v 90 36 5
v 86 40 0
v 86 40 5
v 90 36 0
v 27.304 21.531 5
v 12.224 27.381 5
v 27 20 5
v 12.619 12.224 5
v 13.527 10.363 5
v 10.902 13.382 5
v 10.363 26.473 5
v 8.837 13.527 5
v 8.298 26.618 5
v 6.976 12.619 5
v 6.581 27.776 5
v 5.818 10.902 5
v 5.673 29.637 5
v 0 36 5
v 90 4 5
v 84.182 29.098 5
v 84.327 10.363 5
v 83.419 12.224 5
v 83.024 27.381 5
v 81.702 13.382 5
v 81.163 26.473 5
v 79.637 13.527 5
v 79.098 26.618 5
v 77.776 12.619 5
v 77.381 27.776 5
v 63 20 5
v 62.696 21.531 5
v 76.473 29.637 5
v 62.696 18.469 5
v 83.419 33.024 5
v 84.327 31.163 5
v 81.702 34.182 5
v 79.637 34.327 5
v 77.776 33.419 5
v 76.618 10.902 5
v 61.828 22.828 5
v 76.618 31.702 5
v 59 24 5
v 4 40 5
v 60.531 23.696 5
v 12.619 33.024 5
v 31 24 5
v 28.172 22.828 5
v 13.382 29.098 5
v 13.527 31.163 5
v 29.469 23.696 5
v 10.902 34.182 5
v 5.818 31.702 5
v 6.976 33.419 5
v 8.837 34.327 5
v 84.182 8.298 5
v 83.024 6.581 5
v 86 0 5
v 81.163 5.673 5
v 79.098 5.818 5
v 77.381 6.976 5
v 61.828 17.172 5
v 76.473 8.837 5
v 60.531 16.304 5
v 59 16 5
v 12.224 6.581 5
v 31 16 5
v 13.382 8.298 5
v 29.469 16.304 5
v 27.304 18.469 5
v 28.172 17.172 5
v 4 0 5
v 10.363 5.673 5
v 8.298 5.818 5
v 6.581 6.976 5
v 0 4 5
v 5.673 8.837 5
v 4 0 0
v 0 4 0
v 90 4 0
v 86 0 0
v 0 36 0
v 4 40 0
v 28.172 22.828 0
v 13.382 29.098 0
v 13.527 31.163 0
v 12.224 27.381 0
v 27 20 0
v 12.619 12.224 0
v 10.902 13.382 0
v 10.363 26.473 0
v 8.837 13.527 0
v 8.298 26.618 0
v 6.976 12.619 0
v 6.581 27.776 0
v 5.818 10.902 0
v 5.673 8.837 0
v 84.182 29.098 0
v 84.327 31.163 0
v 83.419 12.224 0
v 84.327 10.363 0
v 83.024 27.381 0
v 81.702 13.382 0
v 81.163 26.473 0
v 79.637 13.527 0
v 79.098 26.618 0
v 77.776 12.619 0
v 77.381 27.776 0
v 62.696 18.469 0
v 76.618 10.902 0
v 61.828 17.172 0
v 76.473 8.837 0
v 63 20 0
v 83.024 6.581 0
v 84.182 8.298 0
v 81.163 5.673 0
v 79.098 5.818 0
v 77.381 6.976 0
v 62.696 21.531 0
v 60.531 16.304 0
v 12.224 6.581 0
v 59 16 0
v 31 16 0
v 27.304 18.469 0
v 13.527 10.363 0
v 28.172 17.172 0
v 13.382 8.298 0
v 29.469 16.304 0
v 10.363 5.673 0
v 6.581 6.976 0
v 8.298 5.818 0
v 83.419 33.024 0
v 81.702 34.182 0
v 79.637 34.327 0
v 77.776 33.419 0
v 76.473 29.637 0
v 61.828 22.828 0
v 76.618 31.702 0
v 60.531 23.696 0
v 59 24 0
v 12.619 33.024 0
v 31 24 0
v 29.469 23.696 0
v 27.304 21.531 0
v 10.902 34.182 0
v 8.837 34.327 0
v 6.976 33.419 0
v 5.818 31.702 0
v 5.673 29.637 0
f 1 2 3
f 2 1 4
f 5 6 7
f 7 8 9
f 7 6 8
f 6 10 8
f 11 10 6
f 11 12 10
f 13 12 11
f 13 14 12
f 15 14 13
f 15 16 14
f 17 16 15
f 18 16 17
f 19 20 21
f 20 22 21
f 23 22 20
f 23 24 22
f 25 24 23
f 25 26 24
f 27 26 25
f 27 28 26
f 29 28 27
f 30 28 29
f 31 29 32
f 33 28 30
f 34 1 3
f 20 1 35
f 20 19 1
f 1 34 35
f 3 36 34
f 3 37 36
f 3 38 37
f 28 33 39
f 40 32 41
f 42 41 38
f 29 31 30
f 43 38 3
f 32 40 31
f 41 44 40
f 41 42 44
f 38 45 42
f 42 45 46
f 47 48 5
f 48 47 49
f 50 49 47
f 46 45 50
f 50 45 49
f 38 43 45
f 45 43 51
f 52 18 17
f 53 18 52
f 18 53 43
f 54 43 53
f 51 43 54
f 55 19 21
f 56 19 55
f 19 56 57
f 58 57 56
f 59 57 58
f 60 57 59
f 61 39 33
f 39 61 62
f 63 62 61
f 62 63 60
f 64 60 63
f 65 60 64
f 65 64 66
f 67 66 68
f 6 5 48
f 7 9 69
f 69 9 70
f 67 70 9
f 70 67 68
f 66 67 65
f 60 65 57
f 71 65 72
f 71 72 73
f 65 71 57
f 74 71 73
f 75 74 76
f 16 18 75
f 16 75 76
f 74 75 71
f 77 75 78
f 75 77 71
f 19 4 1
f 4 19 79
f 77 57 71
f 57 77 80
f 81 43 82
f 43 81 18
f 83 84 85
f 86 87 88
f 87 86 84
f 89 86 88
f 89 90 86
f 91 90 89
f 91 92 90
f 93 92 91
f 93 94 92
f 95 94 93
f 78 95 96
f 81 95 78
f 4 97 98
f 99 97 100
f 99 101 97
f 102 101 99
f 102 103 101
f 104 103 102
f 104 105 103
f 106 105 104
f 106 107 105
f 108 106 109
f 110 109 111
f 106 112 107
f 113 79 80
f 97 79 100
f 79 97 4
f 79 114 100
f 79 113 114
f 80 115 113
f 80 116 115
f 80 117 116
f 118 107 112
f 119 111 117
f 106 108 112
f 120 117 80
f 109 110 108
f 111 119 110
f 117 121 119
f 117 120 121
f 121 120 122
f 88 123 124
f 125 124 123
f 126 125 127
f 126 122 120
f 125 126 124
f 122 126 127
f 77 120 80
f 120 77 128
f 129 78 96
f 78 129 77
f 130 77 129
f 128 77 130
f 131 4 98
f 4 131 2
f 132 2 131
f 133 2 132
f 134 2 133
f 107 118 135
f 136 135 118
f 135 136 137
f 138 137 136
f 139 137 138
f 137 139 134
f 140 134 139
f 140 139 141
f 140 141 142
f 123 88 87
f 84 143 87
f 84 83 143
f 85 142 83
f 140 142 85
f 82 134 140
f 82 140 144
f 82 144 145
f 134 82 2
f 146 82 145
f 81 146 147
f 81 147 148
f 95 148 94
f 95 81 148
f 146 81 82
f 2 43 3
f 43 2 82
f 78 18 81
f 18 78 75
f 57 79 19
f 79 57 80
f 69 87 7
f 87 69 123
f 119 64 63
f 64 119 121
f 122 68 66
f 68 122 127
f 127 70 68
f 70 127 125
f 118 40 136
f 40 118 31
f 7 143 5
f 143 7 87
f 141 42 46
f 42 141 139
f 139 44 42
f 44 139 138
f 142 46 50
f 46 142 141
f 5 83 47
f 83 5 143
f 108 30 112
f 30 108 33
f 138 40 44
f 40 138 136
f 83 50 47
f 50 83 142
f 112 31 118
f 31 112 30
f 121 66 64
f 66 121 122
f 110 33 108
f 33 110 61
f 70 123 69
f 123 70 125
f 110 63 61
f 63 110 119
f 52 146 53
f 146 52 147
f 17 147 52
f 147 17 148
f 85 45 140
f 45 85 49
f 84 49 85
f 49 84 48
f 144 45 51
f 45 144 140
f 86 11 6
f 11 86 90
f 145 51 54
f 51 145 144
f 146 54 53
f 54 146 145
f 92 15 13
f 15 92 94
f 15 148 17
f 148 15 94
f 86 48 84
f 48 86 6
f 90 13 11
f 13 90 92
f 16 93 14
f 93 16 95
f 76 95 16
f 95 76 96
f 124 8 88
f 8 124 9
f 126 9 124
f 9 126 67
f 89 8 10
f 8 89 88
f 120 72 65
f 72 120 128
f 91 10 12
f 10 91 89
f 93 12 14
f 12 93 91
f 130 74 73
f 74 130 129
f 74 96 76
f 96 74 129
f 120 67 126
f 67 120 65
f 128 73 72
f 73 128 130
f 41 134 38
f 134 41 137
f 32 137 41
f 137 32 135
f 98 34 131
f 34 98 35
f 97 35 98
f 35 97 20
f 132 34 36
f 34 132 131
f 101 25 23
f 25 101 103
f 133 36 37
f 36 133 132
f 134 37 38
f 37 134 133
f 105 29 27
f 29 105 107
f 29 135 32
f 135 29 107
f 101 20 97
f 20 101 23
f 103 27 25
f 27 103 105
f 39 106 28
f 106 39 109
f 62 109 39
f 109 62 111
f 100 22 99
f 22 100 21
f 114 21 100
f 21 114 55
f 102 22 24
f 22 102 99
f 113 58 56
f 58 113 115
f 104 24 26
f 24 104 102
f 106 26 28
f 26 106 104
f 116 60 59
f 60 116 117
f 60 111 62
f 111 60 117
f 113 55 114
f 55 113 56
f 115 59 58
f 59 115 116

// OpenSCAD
$fn = 32;

// ----------------------------------------------------------------------
// Bracket plate: slot plate 90 x 40
// ----------------------------------------------------------------------

// --- parameters (mm) ---
hole_r = 4;               // bolt hole radius
plate_t = 5;              // plate thickness, Z (extrusion height)
plate_l = 90;             // plate length
plate_w = 40;             // plate width
slot_l = 28;              // slot straight length
slot_r = 4;               // slot end radius

slot_len = slot_l + 2 * slot_r;
slot_w = 2 * slot_r;
hole_d2 = 2 * hole_r;

profile = [[4, 0], [86, 0], [90, 4], [90, 36], [86, 40], [4, 40], [0, 36], [0, 4]];  // primary outline, 8 points, counter clockwise
void_1 = [[59, 16], [60.531, 16.304], [61.828, 17.172], [62.696, 18.469], [63, 20], [62.696, 21.531], [61.828, 22.828], [60.531, 23.696], [59, 24], [31, 24], [29.469, 23.696], [28.172, 22.828], [27.304, 21.531], [27, 20], [27.304, 18.469], [28.172, 17.172], [29.469, 16.304], [31, 16]];  // grip slot, 18 points
void_2 = [[13.527, 31.163], [12.619, 33.024], [10.902, 34.182], [8.837, 34.327], [6.976, 33.419], [5.818, 31.702], [5.673, 29.637], [6.581, 27.776], [8.298, 26.618], [10.363, 26.473], [12.224, 27.381], [13.382, 29.098]];  // corner hole, 12 points
void_3 = [[13.527, 10.363], [12.619, 12.224], [10.902, 13.382], [8.837, 13.527], [6.976, 12.619], [5.818, 10.902], [5.673, 8.837], [6.581, 6.976], [8.298, 5.818], [10.363, 5.673], [12.224, 6.581], [13.382, 8.298]];  // corner hole, 12 points
void_4 = [[84.327, 31.163], [83.419, 33.024], [81.702, 34.182], [79.637, 34.327], [77.776, 33.419], [76.618, 31.702], [76.473, 29.637], [77.381, 27.776], [79.098, 26.618], [81.163, 26.473], [83.024, 27.381], [84.182, 29.098]];  // corner hole, 12 points
void_5 = [[84.327, 10.363], [83.419, 12.224], [81.702, 13.382], [79.637, 13.527], [77.776, 12.619], [76.618, 10.902], [76.473, 8.837], [77.381, 6.976], [79.098, 5.818], [81.163, 5.673], [83.024, 6.581], [84.182, 8.298]];  // corner hole, 12 points

// --- the one profile operation ---
difference() {
  linear_extrude(height = plate_t) polygon(points = profile);
  translate([0, 0, -1])
    linear_extrude(height = plate_t + 2) polygon(points = void_1);
  translate([0, 0, -1])
    linear_extrude(height = plate_t + 2) polygon(points = void_2);
  translate([0, 0, -1])
    linear_extrude(height = plate_t + 2) polygon(points = void_3);
  translate([0, 0, -1])
    linear_extrude(height = plate_t + 2) polygon(points = void_4);
  translate([0, 0, -1])
    linear_extrude(height = plate_t + 2) polygon(points = void_5);
}
